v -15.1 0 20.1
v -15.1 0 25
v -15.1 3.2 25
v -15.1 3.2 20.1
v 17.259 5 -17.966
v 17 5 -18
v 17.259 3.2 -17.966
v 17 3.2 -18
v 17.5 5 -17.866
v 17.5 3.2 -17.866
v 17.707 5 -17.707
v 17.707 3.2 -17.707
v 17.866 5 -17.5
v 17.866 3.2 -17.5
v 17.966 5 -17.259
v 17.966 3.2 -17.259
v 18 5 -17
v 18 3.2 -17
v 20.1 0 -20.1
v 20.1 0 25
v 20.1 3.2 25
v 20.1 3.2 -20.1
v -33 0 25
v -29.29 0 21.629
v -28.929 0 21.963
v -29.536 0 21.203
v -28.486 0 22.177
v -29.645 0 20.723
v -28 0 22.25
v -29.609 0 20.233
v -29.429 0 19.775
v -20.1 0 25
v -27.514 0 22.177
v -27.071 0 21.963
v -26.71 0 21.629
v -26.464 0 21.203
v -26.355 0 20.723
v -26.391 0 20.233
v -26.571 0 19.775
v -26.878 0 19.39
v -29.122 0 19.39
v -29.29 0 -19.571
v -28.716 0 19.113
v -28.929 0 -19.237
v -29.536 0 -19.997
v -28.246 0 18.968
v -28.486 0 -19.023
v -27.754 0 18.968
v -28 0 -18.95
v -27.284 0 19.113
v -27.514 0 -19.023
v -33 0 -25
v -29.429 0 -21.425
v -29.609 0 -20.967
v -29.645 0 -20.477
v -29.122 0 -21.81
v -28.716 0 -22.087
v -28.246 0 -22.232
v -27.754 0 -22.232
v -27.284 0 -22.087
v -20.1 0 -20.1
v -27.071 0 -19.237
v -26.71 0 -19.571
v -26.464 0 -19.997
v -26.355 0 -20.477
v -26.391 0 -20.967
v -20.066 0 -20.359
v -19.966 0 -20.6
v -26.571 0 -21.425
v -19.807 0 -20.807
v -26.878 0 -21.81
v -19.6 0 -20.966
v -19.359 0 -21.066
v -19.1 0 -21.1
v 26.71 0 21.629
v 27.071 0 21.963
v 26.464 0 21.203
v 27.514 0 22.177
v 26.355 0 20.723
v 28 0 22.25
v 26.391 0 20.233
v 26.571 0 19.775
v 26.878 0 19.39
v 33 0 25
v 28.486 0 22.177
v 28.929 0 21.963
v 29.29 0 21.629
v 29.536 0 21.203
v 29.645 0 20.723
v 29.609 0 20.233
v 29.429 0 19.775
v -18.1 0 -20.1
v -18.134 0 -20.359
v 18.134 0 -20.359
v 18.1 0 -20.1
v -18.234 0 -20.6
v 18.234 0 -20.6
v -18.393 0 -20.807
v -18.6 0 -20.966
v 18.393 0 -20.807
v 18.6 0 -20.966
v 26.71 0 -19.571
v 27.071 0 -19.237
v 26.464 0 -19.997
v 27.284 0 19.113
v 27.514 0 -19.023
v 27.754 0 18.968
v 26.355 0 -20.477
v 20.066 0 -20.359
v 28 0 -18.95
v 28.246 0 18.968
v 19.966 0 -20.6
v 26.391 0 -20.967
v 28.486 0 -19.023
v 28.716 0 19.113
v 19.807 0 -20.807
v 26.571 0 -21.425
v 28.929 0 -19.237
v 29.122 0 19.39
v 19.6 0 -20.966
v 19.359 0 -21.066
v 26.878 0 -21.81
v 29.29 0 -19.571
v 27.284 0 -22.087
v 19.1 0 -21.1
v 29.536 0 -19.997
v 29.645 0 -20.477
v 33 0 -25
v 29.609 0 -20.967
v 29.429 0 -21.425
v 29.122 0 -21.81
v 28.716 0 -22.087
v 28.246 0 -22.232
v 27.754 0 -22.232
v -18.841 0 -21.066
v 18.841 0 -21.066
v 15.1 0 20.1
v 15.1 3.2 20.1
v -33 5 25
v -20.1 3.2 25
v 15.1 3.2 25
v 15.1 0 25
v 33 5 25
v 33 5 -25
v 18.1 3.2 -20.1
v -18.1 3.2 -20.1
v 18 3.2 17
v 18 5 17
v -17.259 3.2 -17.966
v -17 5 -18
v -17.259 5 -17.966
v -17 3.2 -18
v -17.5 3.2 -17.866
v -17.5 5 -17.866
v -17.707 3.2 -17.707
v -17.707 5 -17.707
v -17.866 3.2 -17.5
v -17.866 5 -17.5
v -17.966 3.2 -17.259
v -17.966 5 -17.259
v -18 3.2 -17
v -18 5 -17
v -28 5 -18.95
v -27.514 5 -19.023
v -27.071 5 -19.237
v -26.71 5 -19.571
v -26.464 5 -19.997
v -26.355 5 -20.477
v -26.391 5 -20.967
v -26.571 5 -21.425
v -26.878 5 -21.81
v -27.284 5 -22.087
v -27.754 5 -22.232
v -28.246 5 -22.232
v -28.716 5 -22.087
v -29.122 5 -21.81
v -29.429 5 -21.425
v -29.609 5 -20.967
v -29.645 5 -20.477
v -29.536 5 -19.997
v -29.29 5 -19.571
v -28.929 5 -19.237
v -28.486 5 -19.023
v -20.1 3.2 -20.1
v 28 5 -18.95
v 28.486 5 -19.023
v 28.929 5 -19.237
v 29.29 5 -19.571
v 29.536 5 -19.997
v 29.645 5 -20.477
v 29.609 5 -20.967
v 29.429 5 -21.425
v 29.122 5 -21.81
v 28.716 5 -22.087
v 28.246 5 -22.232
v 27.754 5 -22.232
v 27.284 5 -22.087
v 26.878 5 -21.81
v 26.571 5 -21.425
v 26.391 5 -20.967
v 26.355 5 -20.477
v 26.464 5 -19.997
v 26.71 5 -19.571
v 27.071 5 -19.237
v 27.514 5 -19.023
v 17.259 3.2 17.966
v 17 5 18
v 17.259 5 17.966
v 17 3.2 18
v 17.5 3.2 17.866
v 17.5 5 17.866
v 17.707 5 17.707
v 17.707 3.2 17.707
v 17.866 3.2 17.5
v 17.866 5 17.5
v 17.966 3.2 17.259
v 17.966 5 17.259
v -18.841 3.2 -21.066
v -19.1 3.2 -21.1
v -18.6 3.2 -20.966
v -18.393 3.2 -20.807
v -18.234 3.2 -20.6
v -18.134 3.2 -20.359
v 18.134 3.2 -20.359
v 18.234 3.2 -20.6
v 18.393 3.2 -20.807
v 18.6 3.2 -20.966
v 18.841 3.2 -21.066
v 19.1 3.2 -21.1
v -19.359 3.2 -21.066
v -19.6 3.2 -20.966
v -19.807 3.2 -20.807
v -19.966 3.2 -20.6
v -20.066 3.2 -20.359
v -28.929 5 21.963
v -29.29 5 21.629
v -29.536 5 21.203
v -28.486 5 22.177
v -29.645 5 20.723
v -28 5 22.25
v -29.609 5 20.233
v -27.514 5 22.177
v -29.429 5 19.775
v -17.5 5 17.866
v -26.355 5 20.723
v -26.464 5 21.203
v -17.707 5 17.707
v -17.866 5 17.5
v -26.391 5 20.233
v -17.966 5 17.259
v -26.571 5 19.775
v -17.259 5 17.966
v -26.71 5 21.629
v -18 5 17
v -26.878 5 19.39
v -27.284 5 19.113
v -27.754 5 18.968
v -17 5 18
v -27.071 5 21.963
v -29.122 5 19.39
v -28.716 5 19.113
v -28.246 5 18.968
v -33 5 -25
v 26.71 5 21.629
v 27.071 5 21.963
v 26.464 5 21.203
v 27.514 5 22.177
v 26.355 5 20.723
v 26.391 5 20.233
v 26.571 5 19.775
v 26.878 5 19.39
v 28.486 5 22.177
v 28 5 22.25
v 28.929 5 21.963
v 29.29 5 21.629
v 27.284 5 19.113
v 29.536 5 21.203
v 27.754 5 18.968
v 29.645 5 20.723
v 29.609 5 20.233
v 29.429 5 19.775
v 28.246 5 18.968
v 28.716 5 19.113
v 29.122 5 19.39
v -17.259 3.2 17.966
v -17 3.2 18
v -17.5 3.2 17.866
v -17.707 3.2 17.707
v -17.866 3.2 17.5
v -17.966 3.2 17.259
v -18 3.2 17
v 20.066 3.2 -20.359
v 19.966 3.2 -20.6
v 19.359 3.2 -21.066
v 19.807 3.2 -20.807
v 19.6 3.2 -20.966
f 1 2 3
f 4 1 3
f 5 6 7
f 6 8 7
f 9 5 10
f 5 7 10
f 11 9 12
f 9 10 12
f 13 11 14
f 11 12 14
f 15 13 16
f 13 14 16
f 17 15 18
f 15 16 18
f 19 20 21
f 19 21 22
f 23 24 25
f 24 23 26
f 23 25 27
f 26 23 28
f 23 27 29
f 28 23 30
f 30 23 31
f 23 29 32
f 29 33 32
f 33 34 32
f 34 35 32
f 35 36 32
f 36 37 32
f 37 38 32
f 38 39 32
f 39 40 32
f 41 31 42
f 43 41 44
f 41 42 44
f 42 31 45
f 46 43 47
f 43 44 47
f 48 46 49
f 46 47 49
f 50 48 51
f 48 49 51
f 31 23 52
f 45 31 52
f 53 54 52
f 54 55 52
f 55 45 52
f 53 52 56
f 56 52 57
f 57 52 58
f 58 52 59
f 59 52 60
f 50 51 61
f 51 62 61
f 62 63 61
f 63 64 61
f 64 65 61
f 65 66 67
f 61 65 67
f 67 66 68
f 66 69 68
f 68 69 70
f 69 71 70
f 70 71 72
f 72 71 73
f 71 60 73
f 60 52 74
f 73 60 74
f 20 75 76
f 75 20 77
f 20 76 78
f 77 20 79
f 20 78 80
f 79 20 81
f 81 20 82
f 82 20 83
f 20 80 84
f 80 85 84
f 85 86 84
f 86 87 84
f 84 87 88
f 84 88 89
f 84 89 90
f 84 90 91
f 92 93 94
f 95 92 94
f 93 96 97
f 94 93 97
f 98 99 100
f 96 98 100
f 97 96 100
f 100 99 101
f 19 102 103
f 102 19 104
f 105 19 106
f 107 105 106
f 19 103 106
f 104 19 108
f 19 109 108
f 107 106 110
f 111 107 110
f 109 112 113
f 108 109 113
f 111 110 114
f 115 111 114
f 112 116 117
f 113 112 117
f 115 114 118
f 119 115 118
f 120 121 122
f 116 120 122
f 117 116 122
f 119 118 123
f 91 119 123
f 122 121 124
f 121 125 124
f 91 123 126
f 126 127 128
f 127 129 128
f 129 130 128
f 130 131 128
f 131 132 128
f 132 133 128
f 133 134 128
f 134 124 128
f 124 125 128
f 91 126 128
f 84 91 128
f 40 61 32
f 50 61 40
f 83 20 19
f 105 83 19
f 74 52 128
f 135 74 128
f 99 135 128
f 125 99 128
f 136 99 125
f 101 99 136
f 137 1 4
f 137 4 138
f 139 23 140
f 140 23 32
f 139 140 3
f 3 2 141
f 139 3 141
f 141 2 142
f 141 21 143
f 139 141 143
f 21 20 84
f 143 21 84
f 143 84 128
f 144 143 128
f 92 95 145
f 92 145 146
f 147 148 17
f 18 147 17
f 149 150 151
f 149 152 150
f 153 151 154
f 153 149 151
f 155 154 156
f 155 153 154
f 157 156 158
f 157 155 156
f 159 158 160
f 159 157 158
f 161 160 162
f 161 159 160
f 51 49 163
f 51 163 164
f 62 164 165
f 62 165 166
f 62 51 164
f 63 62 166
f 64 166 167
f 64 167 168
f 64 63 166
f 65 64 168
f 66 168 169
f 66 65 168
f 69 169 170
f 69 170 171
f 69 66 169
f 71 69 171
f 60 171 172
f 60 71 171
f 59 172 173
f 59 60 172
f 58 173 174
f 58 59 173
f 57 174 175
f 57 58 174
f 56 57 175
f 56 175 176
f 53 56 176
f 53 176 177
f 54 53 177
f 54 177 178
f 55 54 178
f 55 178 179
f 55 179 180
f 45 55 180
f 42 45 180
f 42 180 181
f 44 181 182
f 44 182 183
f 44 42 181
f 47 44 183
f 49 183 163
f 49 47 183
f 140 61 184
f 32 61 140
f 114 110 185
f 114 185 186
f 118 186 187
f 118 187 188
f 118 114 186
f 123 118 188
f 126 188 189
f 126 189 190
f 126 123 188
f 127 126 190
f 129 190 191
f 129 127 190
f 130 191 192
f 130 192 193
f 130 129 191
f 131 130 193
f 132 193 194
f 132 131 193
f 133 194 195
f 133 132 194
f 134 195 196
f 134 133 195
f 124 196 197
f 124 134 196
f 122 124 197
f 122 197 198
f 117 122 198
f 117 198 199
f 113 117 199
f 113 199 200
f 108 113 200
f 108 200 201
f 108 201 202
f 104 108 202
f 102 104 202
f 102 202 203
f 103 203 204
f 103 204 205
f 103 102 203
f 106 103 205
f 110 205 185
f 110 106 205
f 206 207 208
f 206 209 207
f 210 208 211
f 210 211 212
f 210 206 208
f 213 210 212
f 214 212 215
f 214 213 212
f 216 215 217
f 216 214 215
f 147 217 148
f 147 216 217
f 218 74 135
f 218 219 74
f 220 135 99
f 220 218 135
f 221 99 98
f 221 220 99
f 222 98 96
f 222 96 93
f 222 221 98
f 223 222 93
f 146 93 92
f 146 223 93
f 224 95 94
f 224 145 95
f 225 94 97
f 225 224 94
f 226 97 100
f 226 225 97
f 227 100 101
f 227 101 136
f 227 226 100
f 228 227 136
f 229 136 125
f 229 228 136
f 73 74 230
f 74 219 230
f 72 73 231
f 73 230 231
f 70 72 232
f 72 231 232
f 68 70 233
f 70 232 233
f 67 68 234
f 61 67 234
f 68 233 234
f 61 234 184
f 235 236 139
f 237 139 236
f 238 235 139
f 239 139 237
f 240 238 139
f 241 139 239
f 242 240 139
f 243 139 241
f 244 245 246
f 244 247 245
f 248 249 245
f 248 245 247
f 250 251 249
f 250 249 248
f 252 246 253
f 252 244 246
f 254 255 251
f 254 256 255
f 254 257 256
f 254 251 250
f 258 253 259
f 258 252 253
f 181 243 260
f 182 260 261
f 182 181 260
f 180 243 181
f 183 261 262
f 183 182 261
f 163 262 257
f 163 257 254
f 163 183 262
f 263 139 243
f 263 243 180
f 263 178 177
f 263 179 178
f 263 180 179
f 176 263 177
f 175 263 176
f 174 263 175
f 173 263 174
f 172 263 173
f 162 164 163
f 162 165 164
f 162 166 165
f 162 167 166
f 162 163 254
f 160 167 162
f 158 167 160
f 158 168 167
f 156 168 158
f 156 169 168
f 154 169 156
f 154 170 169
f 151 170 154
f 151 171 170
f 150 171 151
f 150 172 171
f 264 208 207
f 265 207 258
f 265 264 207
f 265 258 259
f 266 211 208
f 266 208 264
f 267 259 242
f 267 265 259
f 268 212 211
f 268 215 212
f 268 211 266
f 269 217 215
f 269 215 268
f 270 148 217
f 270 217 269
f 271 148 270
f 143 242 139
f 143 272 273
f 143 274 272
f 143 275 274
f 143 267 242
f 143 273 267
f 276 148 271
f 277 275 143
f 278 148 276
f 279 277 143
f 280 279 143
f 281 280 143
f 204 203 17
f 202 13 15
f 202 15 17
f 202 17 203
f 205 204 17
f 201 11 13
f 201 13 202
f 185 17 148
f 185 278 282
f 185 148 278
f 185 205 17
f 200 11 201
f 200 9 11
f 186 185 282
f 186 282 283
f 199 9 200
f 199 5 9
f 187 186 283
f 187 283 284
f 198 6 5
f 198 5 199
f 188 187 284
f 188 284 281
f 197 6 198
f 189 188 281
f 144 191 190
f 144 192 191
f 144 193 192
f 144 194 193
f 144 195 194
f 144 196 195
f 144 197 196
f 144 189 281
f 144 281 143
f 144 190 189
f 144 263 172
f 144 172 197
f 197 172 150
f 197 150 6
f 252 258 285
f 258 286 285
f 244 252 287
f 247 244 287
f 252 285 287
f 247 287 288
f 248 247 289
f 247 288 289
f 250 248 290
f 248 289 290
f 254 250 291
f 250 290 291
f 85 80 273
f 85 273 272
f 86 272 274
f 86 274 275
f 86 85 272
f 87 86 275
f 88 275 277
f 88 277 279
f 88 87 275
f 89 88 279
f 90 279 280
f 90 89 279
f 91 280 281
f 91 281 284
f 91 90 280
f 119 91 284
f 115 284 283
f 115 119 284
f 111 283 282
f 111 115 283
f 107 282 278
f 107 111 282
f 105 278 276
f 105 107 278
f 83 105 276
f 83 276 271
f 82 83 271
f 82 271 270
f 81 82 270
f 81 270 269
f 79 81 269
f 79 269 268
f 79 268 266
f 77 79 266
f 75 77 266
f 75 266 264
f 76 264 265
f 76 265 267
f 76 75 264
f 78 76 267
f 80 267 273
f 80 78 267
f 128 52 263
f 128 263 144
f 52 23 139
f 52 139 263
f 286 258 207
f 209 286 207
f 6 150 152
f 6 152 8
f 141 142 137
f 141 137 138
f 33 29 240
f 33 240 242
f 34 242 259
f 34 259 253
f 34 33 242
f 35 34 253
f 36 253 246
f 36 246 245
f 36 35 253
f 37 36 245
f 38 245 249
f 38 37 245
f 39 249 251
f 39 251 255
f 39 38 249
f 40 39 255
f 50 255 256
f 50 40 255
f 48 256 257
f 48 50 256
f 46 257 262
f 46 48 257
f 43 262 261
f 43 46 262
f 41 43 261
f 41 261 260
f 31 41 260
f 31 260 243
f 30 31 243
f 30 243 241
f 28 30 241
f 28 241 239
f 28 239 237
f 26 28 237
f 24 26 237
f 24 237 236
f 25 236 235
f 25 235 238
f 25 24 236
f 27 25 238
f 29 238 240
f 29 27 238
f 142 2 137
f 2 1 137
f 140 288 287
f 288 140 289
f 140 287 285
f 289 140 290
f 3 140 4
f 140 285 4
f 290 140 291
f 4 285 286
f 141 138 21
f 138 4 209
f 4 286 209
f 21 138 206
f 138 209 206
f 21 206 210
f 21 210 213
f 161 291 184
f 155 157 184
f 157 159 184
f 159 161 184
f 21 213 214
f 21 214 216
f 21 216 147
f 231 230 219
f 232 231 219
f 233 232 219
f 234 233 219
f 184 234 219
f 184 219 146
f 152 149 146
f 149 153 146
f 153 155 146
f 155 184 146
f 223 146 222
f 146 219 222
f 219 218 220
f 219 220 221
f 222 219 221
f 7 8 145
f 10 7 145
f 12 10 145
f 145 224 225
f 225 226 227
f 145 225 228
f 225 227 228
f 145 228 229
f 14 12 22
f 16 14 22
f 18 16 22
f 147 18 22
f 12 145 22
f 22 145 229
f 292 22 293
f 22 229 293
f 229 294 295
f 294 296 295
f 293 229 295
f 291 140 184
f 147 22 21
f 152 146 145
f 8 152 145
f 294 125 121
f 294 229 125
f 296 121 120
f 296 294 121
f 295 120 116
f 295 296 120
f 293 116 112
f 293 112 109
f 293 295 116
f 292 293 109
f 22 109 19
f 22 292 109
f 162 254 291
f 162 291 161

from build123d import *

# Parameters (mm, degrees)
SKETCH1_W           = 66
SKETCH1_H           = 50
SKETCH1_R           = 1.65
BOSS_EXTRUDE1_DEPTH = 5
SKETCH2_W           = 36
SKETCH2_H           = 36
BOSS_EXTRUDE2_DEPTH = 1.8
CUT_EXTRUDE1_REACH  = 62.117
SKETCH3_W           = 5
SKETCH3_H           = 3.2
FILLET1_R           = 1


with BuildPart() as part:
    # Sketch1 → Boss-Extrude1 (new body)
    with BuildSketch(Plane(origin=(0, 0, 0), x_dir=(1, 0, 0), z_dir=(0, 1, 0))):
        Rectangle(SKETCH1_W, SKETCH1_H)
        with Locations(Location((-28, 20.6, 0), (0, 0, 270))):
            Circle(SKETCH1_R, mode=Mode.SUBTRACT)
        with Locations(Location((28, 20.6, 0), (0, 0, 270))):
            Circle(SKETCH1_R, mode=Mode.SUBTRACT)
        with Locations(Location((-28, -20.6, 0), (0, 0, 270))):
            Circle(SKETCH1_R, mode=Mode.SUBTRACT)
        with Locations(Location((28, -20.6, 0), (0, 0, 270))):
            Circle(SKETCH1_R, mode=Mode.SUBTRACT)
        Polygon((20.1, -20.1), (20.1, 21.1), (18.1, 21.1), (18.1, 20.1), (-18.1, 20.1), (-18.1, 21.1), (-20.1, 21.1), (-20.1, -20.1), align=None, mode=Mode.SUBTRACT)
    extrude(amount=BOSS_EXTRUDE1_DEPTH)

    # Sketch2 → Boss-Extrude2 (add)
    with BuildSketch(Plane(origin=(0, 5, 0), x_dir=(1, 0, 0), z_dir=(0, 1, 0))):
        Polygon((-20.1, 21.1), (-20.1, -20.1), (20.1, -20.1), (20.1, 21.1), (18.1, 21.1), (18.1, 20.1), (-18.1, 20.1), (-18.1, 21.1), align=None)
        Rectangle(SKETCH2_W, SKETCH2_H, mode=Mode.SUBTRACT)
    extrude(amount=-BOSS_EXTRUDE2_DEPTH)

    # Sketch3 → Cut-Extrude1 (cut, up to next)
    with BuildSketch(Plane.XY.offset(25), mode=Mode.PRIVATE) as cut_extrude1_sk1:
        with Locations((-17.6, 1.6)):
            Rectangle(SKETCH3_W, SKETCH3_H)
    cut_extrude1_tool1 = extrude(cut_extrude1_sk1.sketch, amount=-CUT_EXTRUDE1_REACH, mode=Mode.PRIVATE) & part.part
    # Sketch3 → Cut-Extrude1 (cut, up to next)
    with BuildSketch(Plane.XY.offset(25), mode=Mode.PRIVATE) as cut_extrude1_sk2:
        with Locations((17.6, 1.6)):
            Rectangle(SKETCH3_W, SKETCH3_H)
    cut_extrude1_tool2 = extrude(cut_extrude1_sk2.sketch, amount=-CUT_EXTRUDE1_REACH, mode=Mode.PRIVATE) & part.part
    add(cut_extrude1_tool1.solids().sort_by_distance((-17.6, 1.6, 25))[0], mode=Mode.SUBTRACT)
    add(cut_extrude1_tool2.solids().sort_by_distance((17.6, 1.6, 25))[0], mode=Mode.SUBTRACT)

    # Fillet1
    fillet1_edges = [part.edges().sort_by_distance(p)[0] for p in [
        (-18, 4.1, 18),
        (18, 4.1, 18),
        (18, 4.1, -18),
        (-18, 4.1, -18),
        (-20.1, 1.6, -21.1),
        (-18.1, 1.6, -21.1),
        (18.1, 1.6, -21.1),
        (20.1, 1.6, -21.1),
    ]]
    fillet(fillet1_edges, radius=FILLET1_R - 0.0001)  # a hair under: the kernel refuses the full size


solid = part.part
